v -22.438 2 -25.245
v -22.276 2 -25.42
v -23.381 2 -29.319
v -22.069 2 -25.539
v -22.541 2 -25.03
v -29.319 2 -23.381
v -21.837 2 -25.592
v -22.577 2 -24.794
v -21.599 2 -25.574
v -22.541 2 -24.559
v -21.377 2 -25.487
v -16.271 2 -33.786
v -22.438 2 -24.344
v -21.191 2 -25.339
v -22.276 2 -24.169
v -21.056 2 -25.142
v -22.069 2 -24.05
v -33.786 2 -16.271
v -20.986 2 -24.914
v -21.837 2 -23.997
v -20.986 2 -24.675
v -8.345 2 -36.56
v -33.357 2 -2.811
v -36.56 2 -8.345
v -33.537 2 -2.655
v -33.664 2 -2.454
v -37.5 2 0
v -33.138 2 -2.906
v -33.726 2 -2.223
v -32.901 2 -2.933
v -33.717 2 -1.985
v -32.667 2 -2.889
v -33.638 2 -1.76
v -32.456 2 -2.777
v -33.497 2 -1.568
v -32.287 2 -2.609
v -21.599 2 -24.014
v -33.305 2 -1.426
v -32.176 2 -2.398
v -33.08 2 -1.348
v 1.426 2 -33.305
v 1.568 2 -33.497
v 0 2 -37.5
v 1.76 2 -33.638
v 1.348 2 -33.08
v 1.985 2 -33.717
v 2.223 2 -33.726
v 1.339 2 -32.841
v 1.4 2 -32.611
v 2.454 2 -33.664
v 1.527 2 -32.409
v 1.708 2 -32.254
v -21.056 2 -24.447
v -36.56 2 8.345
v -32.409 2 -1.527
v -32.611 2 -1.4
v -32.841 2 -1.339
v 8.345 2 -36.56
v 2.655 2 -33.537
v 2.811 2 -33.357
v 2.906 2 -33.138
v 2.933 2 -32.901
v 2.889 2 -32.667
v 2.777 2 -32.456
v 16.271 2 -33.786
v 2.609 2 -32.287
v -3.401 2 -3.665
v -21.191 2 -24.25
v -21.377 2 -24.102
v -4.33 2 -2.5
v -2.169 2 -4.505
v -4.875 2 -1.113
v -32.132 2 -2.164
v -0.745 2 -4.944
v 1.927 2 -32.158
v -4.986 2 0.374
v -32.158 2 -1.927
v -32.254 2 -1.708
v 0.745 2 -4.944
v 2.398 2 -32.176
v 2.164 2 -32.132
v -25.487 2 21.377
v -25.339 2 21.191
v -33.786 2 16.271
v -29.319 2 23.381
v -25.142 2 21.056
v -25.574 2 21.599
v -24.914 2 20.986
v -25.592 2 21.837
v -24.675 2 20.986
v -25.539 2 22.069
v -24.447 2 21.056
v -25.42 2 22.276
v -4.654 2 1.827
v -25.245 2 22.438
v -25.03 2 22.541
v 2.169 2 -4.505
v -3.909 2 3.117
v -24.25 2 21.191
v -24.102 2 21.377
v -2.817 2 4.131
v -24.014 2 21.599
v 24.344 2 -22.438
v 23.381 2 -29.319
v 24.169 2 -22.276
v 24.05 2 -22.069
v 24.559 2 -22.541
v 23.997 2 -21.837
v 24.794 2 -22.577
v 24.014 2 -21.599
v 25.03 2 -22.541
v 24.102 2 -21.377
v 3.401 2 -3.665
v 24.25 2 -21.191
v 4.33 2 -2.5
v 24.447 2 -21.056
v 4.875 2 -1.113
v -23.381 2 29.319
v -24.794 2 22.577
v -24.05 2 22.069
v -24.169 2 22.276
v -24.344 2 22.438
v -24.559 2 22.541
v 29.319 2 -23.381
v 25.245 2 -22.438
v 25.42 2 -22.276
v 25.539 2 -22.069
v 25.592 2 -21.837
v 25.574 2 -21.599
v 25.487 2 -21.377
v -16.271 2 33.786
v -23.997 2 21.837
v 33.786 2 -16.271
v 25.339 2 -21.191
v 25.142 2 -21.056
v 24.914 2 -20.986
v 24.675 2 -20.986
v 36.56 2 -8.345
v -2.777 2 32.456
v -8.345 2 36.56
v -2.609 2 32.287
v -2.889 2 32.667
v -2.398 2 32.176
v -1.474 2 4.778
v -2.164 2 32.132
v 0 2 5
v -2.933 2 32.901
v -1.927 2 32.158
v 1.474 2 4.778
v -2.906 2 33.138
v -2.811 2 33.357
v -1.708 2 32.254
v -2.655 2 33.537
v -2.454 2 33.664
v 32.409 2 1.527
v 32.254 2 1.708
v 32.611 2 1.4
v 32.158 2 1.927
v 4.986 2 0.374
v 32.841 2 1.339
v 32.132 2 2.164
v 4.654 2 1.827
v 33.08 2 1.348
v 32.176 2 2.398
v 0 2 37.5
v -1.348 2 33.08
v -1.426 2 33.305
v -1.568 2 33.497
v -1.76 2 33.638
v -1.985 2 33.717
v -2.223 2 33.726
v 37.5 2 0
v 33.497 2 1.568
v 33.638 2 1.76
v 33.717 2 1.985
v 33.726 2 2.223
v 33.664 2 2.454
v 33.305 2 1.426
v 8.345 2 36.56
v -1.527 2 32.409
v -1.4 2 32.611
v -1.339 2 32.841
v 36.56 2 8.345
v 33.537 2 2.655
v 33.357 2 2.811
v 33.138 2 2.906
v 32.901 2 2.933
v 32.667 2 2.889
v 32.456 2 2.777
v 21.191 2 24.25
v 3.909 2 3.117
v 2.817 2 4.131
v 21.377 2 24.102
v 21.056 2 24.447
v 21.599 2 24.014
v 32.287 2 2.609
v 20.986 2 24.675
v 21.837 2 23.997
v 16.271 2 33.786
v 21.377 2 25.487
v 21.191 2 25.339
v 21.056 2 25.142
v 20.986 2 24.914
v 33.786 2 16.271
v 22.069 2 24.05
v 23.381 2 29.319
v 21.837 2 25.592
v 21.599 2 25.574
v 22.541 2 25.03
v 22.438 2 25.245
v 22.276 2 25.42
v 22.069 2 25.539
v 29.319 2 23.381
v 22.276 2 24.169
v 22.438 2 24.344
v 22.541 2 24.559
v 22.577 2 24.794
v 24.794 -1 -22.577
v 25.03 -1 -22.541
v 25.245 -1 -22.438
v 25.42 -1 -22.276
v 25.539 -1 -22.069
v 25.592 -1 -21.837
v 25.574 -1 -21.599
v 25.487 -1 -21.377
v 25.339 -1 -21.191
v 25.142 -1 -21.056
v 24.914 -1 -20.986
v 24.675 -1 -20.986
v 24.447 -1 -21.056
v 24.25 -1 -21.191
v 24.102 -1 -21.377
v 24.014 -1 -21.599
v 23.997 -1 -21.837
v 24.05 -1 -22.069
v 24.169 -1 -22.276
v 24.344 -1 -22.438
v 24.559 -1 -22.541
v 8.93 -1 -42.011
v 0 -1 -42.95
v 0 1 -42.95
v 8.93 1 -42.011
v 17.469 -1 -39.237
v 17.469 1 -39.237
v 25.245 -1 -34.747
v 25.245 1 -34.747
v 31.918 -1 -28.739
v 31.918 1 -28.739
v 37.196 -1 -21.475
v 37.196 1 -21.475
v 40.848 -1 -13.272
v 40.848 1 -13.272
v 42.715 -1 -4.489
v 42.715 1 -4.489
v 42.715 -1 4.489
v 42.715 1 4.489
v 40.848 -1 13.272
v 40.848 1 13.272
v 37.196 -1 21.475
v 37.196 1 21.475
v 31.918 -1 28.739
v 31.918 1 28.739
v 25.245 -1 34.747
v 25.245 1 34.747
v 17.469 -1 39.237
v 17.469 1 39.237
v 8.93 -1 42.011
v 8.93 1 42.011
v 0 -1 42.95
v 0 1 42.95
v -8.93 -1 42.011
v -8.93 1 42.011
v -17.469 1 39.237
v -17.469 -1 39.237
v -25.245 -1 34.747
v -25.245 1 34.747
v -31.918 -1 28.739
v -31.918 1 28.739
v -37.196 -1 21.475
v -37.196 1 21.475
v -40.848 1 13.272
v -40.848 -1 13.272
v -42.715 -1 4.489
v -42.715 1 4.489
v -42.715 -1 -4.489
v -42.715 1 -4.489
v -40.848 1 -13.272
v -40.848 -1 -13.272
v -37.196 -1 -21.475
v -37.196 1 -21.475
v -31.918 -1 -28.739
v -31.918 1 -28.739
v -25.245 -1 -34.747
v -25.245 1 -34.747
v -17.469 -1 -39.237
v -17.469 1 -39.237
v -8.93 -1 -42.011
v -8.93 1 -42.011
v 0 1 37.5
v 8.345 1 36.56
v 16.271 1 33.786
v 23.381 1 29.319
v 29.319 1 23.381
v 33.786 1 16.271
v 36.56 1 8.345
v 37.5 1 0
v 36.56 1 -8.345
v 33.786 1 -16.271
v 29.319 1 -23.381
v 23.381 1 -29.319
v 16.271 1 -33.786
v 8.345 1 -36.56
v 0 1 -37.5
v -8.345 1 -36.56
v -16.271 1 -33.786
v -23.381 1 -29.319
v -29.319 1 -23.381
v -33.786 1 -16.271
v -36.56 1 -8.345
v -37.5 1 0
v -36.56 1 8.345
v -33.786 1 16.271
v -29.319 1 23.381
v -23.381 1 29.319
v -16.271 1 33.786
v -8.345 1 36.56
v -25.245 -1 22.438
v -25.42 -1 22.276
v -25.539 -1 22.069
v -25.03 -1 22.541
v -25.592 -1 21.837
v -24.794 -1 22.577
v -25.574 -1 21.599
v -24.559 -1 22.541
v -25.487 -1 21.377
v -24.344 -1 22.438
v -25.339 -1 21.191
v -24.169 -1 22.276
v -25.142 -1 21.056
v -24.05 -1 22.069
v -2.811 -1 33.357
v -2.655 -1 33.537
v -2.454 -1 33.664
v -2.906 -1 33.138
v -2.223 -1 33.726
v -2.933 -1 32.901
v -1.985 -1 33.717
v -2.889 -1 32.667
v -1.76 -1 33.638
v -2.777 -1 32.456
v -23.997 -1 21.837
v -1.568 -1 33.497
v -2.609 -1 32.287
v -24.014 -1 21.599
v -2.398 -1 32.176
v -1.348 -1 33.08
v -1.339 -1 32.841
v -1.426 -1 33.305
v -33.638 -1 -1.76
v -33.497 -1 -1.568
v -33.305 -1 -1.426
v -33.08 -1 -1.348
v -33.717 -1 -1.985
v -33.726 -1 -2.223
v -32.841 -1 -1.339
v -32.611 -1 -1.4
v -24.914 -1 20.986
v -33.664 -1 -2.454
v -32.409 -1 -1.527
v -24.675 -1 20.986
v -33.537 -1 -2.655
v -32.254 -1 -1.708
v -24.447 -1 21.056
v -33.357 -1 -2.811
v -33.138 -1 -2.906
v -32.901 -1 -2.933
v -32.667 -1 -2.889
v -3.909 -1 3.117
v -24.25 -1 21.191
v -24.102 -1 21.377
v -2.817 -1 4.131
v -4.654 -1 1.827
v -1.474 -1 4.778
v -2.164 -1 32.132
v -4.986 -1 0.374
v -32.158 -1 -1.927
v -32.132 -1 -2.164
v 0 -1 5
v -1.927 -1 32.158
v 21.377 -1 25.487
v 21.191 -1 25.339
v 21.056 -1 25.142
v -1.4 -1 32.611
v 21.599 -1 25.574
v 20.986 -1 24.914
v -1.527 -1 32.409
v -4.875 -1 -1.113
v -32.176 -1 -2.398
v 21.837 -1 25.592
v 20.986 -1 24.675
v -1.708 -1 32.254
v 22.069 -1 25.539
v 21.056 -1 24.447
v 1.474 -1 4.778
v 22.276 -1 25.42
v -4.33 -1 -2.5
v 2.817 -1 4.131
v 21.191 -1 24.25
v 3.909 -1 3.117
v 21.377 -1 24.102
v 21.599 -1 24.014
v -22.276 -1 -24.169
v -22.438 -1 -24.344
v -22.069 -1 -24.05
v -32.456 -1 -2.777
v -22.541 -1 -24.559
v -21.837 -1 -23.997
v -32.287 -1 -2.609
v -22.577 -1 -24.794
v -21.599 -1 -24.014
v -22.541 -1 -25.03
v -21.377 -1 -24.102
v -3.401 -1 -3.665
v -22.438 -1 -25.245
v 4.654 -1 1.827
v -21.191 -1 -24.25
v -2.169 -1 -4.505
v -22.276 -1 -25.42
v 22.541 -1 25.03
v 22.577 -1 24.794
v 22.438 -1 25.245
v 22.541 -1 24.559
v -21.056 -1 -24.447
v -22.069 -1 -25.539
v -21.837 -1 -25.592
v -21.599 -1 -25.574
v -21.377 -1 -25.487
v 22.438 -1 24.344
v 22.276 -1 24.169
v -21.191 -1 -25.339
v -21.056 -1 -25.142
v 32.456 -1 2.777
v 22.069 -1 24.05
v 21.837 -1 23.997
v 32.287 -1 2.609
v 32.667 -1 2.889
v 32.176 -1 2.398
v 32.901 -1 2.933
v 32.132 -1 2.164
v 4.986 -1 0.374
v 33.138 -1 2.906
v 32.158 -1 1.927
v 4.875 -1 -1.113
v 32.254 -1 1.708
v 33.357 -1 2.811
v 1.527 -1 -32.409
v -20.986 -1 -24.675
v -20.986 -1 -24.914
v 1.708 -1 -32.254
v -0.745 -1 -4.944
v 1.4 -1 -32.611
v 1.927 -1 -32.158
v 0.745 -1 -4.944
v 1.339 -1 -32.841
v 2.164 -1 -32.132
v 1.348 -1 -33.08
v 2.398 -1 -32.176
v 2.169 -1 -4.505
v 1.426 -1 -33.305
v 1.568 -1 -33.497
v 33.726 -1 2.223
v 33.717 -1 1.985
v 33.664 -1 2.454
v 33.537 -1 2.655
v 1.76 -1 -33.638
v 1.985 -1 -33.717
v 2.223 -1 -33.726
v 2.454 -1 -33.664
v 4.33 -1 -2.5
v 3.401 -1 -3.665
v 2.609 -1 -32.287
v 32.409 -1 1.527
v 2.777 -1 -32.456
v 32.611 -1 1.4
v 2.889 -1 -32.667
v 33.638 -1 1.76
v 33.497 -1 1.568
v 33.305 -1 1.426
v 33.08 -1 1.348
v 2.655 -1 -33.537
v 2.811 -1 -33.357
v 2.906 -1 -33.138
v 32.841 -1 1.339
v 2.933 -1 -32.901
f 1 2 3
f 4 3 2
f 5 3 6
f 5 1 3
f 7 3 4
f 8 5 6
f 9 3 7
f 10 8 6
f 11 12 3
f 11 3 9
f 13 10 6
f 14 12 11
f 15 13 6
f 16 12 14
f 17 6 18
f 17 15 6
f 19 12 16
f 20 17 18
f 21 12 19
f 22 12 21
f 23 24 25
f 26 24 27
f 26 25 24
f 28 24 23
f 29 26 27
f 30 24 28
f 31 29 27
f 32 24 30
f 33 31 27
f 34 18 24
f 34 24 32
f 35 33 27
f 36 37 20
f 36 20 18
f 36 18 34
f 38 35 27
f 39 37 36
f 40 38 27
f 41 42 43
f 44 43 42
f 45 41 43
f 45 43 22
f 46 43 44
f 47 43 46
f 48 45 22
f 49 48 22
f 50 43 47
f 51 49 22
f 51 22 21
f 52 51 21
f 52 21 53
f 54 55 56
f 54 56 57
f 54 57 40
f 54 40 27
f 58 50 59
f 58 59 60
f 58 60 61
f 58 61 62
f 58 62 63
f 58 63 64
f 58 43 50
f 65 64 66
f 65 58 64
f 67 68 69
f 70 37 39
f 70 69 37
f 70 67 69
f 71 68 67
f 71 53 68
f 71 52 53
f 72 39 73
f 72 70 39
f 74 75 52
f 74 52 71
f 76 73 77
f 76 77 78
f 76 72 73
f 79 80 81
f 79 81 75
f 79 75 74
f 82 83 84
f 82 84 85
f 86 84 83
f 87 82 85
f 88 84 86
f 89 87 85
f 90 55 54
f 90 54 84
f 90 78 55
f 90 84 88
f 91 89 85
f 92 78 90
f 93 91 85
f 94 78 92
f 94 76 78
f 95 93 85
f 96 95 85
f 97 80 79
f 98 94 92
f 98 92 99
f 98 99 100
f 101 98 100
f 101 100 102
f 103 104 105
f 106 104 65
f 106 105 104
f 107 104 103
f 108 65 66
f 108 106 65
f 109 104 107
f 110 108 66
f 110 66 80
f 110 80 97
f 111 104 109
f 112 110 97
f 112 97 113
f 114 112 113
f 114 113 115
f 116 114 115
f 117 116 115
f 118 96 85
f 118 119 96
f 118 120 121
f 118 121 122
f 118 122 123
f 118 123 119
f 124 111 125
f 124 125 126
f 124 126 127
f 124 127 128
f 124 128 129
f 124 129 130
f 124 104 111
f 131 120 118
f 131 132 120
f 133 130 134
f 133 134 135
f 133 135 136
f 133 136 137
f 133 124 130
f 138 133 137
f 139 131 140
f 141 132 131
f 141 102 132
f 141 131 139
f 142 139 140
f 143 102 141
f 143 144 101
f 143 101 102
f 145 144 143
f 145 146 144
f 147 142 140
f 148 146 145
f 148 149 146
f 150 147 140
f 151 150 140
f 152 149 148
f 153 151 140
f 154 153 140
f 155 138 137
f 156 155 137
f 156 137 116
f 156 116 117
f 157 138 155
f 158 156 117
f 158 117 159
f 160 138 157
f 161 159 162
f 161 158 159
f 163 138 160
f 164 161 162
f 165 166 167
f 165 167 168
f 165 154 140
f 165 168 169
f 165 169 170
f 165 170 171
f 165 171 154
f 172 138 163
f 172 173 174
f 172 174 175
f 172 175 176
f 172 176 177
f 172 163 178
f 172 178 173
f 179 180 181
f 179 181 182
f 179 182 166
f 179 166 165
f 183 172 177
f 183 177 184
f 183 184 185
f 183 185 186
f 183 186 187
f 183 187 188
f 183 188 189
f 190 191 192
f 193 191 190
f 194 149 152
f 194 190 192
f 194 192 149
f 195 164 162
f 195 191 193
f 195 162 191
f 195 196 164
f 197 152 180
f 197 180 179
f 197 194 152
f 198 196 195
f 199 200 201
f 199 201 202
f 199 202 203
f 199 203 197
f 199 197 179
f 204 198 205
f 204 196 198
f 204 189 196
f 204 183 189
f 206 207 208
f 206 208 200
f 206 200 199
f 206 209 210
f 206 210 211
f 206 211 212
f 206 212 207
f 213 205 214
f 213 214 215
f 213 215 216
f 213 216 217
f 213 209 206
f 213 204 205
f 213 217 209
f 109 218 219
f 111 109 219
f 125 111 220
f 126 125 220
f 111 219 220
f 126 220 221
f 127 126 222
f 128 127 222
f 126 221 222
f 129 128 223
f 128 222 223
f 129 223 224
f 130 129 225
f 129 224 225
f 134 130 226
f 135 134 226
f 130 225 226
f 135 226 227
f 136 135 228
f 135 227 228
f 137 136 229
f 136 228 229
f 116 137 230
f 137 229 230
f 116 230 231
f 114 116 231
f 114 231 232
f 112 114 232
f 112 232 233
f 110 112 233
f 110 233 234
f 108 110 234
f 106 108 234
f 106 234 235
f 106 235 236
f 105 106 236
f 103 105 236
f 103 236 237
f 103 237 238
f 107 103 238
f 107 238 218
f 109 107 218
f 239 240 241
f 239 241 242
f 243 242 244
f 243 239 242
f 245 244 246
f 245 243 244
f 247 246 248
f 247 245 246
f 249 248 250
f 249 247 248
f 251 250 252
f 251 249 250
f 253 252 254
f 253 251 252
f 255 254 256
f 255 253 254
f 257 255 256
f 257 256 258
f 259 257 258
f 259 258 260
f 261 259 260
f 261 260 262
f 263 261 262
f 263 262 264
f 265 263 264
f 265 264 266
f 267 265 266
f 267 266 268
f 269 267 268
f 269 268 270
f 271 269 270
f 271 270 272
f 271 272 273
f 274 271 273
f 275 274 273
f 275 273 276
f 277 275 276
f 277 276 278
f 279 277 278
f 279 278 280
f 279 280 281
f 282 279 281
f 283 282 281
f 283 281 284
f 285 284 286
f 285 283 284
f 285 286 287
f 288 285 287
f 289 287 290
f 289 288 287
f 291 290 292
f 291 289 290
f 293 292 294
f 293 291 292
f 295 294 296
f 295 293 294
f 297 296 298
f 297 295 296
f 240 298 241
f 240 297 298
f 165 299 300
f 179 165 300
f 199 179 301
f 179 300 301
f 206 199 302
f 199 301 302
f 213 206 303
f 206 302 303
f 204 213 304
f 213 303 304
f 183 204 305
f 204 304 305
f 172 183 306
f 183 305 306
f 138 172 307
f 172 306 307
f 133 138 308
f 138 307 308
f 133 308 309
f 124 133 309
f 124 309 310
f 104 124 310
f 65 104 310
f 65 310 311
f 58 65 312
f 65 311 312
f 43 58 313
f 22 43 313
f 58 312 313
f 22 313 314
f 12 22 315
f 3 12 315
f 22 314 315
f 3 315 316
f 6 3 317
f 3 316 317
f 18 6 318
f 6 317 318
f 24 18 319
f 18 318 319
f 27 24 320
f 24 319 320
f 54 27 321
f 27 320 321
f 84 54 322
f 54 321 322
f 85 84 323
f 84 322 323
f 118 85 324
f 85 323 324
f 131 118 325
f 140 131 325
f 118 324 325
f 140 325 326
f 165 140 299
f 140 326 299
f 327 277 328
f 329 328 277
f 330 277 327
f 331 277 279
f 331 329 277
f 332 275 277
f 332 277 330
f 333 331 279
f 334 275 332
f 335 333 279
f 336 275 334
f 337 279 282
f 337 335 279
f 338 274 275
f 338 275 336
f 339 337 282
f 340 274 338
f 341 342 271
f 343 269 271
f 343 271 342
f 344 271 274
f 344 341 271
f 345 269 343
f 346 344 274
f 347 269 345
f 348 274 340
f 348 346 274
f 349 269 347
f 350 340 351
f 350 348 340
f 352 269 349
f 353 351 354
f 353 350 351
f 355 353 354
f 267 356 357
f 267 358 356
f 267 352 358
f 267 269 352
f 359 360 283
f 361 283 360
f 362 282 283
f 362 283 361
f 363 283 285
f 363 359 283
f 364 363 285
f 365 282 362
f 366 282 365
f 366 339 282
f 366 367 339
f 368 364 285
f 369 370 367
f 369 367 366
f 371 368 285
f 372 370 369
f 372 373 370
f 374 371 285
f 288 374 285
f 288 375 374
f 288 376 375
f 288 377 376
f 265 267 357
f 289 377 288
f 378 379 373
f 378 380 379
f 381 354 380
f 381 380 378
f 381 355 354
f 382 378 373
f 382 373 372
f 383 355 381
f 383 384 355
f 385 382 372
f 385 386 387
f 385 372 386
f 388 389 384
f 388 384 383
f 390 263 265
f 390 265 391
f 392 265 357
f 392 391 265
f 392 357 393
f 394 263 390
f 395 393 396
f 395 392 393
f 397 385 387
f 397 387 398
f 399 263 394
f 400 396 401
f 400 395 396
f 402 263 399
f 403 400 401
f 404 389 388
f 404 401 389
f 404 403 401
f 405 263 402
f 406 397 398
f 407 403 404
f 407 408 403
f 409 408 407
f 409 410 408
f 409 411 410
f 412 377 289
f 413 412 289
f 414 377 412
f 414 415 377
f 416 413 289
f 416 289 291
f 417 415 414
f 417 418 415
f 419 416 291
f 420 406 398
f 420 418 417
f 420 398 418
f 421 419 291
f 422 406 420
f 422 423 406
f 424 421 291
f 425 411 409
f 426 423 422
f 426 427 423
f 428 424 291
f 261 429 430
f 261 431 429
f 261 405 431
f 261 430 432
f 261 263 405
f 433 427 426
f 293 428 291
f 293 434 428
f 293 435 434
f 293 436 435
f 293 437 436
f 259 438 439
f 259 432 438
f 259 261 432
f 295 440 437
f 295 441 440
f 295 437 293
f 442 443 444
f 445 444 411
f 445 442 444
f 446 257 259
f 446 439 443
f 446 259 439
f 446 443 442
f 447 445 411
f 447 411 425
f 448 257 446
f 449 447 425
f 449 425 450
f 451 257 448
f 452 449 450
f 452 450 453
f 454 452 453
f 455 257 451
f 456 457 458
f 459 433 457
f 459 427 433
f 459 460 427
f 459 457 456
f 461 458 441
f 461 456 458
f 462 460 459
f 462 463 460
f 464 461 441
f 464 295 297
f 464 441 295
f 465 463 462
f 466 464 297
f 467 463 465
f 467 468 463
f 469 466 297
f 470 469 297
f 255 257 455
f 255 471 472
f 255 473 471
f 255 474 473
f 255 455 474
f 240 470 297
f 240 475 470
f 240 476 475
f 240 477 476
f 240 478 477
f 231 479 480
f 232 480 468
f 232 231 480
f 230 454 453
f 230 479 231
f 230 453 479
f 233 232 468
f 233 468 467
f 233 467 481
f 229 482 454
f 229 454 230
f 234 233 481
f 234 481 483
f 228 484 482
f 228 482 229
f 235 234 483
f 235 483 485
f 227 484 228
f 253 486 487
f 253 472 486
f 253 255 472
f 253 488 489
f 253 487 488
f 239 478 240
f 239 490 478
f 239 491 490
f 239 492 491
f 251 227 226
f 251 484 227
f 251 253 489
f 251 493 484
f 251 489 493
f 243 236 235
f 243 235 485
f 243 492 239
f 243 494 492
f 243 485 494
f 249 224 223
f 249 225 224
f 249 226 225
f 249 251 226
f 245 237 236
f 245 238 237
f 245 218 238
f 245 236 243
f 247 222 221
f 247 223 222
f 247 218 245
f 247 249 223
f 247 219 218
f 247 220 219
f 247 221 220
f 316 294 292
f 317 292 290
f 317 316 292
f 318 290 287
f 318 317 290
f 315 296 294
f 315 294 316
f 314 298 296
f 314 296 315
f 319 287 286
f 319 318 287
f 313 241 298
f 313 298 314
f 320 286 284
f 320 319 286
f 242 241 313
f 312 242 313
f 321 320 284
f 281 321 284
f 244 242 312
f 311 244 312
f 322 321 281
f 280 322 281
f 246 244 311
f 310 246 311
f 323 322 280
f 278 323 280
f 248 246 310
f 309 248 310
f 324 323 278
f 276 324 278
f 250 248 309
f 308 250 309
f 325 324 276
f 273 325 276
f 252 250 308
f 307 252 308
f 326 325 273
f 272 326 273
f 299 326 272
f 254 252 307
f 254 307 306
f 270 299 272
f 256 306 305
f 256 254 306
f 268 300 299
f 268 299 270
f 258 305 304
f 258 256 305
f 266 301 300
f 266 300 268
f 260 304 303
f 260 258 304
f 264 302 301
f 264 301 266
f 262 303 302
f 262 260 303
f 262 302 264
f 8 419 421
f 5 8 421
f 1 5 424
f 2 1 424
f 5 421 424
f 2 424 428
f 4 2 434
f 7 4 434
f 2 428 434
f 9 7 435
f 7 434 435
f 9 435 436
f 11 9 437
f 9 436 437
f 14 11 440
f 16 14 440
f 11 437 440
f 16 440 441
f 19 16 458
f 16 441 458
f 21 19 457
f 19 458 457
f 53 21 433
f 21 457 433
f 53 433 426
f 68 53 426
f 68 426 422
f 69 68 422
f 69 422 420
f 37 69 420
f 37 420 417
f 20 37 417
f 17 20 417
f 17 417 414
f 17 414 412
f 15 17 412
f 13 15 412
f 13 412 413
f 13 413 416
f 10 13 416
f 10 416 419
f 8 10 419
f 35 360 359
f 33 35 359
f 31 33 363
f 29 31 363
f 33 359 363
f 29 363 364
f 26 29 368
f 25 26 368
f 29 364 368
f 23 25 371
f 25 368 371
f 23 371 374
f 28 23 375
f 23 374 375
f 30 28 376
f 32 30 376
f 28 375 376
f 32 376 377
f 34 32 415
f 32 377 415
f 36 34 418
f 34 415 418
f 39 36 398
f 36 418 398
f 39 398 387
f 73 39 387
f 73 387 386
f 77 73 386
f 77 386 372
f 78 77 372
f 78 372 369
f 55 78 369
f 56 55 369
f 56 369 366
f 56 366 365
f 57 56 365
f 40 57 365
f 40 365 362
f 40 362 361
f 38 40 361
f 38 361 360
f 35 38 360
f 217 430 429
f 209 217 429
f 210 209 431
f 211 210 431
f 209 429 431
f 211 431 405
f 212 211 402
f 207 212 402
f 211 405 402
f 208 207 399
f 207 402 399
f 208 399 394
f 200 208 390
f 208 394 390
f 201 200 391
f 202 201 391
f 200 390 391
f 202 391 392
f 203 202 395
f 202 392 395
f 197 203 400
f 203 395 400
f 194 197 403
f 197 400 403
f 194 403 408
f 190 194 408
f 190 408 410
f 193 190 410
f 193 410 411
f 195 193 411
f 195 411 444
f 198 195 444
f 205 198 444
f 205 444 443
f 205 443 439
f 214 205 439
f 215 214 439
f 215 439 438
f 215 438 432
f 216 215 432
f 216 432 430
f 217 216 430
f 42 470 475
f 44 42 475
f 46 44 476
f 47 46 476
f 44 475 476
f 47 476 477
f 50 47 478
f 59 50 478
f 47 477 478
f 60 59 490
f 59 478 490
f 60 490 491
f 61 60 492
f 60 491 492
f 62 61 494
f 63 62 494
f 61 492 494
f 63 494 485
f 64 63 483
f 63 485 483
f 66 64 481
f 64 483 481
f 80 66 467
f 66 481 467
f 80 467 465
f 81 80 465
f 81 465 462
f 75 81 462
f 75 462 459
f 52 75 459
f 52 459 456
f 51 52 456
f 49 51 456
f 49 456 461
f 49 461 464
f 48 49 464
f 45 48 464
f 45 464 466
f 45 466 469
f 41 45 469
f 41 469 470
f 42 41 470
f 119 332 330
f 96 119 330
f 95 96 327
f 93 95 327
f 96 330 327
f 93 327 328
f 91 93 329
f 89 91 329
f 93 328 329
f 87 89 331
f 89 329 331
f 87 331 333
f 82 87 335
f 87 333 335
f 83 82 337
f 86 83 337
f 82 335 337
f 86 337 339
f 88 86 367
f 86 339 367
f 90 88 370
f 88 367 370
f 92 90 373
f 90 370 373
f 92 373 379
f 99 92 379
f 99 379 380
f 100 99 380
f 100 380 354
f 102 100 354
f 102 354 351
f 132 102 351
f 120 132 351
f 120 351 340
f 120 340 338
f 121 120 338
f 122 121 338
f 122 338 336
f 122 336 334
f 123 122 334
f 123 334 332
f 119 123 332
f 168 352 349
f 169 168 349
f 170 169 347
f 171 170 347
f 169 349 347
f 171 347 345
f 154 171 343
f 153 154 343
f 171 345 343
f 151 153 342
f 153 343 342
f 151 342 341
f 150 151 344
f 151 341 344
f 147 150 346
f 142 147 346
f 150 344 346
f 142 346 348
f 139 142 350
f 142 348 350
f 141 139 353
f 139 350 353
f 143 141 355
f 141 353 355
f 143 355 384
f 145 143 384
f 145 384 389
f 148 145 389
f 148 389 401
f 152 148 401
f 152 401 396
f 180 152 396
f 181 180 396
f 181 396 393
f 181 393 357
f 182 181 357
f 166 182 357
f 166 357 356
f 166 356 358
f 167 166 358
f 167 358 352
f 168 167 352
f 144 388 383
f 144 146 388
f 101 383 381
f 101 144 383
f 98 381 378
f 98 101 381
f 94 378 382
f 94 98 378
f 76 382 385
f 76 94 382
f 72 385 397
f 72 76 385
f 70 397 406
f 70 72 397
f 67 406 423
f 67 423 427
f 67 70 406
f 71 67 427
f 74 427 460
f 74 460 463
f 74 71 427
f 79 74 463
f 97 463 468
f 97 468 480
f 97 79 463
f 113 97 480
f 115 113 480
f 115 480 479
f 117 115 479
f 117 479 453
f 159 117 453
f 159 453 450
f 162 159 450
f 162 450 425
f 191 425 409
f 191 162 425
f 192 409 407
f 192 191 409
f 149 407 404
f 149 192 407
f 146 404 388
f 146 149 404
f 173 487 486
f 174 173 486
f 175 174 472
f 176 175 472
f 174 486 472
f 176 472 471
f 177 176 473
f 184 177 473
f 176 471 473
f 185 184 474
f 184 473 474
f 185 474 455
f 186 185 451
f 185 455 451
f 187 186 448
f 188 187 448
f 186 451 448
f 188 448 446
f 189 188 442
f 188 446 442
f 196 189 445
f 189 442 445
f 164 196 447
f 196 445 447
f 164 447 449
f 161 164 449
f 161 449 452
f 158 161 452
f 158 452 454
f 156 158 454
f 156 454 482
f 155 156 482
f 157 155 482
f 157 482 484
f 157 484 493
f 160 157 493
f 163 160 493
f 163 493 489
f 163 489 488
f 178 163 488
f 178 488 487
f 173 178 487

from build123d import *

# Parameters (mm, degrees)
SKETCH_1_R               = 43
EXTRUDE_1_DEPTH          = 1
SKETCH_2_R               = 37.5
EXTRUDE_2_DEPTH          = 1
SKETCH_3_R               = 5
CUT_EXTRUDE_1_DEPTH      = 50
SKETCH_4_R               = 43
SKETCH_4_R_2             = 5
EXTRUDE_3_DEPTH          = 1
SKETCH_5_OUTSIDE_W       = 112.332
SKETCH_5_OUTSIDE_H       = 112.332
SKETCH_5_OUTSIDE_R       = 42.95
CUT_EXTRUDE_2_DEPTH      = 500
SKETCH_6_R               = 0.8
CUT_EXTRUDE_3_DEPTH      = 500
PATTERN_CIRCULAR_1_COUNT = 8


with BuildPart() as part:
    # 草图1 → 凸台-拉伸1 (new body)
    with BuildSketch(Plane(origin=(0, 0, 0), x_dir=(1, 0, 0), z_dir=(0, 1, 0))):
        with Locations(Location((0, 0, 0), (0, 0, 270))):
            Circle(SKETCH_1_R)
    extrude(amount=EXTRUDE_1_DEPTH)

    # 草图2 → 凸台-拉伸2 (add)
    with BuildSketch(Plane(origin=(0, 1, 0), x_dir=(1, 0, 0), z_dir=(0, 1, 0))):
        with Locations(Location((0, 0, 0), (0, 0, 270))):
            Circle(SKETCH_2_R)
    extrude(amount=EXTRUDE_2_DEPTH)

    # 草图3 → 切除-拉伸1 (cut)
    with BuildSketch(Plane(origin=(0, 2, 0), x_dir=(1, 0, 0), z_dir=(0, 1, 0))):
        with Locations(Location((0, 0, 0), (0, 0, 270))):
            Circle(SKETCH_3_R)
    extrude(amount=-CUT_EXTRUDE_1_DEPTH, mode=Mode.SUBTRACT)

    # 草图4 → 凸台-拉伸3 (add)
    with BuildSketch(Plane.XZ):
        with Locations(Location((0, 0, 0), (0, 0, 270))):
            Circle(SKETCH_4_R)
        with Locations(Location((0, 0, 0), (0, 0, 90))):
            Circle(SKETCH_4_R_2, mode=Mode.SUBTRACT)
    extrude(amount=EXTRUDE_3_DEPTH)

    # 草图5 outside → 切除-拉伸2 (cut)
    with BuildSketch(Plane.XZ.offset(1)):
        Rectangle(SKETCH_5_OUTSIDE_W, SKETCH_5_OUTSIDE_H)
        with Locations(Location((0, 0, 0), (0, 0, 270))):
            Circle(SKETCH_5_OUTSIDE_R, mode=Mode.SUBTRACT)
    extrude(amount=-CUT_EXTRUDE_2_DEPTH, mode=Mode.SUBTRACT)

    # 草图6 → 切除-拉伸3 (cut)
    with BuildSketch(Plane.XZ.offset(1)):
        with Locations(Location((24.794413226, -21.776984933, 0), (0, 0, 270))):
            Circle(SKETCH_6_R)
    cut_extrude_3 = extrude(amount=-CUT_EXTRUDE_3_DEPTH, mode=Mode.SUBTRACT)

    # 阵列(圆周)1: 切除-拉伸3 ×8 about axis
    pattern_circular_1_axis = Axis((0, 0, 0), (0, 1, 0))
    for i in range(1, PATTERN_CIRCULAR_1_COUNT):
        add(cut_extrude_3.rotate(pattern_circular_1_axis, i * 360 / PATTERN_CIRCULAR_1_COUNT), mode=Mode.SUBTRACT)


solid = part.part
